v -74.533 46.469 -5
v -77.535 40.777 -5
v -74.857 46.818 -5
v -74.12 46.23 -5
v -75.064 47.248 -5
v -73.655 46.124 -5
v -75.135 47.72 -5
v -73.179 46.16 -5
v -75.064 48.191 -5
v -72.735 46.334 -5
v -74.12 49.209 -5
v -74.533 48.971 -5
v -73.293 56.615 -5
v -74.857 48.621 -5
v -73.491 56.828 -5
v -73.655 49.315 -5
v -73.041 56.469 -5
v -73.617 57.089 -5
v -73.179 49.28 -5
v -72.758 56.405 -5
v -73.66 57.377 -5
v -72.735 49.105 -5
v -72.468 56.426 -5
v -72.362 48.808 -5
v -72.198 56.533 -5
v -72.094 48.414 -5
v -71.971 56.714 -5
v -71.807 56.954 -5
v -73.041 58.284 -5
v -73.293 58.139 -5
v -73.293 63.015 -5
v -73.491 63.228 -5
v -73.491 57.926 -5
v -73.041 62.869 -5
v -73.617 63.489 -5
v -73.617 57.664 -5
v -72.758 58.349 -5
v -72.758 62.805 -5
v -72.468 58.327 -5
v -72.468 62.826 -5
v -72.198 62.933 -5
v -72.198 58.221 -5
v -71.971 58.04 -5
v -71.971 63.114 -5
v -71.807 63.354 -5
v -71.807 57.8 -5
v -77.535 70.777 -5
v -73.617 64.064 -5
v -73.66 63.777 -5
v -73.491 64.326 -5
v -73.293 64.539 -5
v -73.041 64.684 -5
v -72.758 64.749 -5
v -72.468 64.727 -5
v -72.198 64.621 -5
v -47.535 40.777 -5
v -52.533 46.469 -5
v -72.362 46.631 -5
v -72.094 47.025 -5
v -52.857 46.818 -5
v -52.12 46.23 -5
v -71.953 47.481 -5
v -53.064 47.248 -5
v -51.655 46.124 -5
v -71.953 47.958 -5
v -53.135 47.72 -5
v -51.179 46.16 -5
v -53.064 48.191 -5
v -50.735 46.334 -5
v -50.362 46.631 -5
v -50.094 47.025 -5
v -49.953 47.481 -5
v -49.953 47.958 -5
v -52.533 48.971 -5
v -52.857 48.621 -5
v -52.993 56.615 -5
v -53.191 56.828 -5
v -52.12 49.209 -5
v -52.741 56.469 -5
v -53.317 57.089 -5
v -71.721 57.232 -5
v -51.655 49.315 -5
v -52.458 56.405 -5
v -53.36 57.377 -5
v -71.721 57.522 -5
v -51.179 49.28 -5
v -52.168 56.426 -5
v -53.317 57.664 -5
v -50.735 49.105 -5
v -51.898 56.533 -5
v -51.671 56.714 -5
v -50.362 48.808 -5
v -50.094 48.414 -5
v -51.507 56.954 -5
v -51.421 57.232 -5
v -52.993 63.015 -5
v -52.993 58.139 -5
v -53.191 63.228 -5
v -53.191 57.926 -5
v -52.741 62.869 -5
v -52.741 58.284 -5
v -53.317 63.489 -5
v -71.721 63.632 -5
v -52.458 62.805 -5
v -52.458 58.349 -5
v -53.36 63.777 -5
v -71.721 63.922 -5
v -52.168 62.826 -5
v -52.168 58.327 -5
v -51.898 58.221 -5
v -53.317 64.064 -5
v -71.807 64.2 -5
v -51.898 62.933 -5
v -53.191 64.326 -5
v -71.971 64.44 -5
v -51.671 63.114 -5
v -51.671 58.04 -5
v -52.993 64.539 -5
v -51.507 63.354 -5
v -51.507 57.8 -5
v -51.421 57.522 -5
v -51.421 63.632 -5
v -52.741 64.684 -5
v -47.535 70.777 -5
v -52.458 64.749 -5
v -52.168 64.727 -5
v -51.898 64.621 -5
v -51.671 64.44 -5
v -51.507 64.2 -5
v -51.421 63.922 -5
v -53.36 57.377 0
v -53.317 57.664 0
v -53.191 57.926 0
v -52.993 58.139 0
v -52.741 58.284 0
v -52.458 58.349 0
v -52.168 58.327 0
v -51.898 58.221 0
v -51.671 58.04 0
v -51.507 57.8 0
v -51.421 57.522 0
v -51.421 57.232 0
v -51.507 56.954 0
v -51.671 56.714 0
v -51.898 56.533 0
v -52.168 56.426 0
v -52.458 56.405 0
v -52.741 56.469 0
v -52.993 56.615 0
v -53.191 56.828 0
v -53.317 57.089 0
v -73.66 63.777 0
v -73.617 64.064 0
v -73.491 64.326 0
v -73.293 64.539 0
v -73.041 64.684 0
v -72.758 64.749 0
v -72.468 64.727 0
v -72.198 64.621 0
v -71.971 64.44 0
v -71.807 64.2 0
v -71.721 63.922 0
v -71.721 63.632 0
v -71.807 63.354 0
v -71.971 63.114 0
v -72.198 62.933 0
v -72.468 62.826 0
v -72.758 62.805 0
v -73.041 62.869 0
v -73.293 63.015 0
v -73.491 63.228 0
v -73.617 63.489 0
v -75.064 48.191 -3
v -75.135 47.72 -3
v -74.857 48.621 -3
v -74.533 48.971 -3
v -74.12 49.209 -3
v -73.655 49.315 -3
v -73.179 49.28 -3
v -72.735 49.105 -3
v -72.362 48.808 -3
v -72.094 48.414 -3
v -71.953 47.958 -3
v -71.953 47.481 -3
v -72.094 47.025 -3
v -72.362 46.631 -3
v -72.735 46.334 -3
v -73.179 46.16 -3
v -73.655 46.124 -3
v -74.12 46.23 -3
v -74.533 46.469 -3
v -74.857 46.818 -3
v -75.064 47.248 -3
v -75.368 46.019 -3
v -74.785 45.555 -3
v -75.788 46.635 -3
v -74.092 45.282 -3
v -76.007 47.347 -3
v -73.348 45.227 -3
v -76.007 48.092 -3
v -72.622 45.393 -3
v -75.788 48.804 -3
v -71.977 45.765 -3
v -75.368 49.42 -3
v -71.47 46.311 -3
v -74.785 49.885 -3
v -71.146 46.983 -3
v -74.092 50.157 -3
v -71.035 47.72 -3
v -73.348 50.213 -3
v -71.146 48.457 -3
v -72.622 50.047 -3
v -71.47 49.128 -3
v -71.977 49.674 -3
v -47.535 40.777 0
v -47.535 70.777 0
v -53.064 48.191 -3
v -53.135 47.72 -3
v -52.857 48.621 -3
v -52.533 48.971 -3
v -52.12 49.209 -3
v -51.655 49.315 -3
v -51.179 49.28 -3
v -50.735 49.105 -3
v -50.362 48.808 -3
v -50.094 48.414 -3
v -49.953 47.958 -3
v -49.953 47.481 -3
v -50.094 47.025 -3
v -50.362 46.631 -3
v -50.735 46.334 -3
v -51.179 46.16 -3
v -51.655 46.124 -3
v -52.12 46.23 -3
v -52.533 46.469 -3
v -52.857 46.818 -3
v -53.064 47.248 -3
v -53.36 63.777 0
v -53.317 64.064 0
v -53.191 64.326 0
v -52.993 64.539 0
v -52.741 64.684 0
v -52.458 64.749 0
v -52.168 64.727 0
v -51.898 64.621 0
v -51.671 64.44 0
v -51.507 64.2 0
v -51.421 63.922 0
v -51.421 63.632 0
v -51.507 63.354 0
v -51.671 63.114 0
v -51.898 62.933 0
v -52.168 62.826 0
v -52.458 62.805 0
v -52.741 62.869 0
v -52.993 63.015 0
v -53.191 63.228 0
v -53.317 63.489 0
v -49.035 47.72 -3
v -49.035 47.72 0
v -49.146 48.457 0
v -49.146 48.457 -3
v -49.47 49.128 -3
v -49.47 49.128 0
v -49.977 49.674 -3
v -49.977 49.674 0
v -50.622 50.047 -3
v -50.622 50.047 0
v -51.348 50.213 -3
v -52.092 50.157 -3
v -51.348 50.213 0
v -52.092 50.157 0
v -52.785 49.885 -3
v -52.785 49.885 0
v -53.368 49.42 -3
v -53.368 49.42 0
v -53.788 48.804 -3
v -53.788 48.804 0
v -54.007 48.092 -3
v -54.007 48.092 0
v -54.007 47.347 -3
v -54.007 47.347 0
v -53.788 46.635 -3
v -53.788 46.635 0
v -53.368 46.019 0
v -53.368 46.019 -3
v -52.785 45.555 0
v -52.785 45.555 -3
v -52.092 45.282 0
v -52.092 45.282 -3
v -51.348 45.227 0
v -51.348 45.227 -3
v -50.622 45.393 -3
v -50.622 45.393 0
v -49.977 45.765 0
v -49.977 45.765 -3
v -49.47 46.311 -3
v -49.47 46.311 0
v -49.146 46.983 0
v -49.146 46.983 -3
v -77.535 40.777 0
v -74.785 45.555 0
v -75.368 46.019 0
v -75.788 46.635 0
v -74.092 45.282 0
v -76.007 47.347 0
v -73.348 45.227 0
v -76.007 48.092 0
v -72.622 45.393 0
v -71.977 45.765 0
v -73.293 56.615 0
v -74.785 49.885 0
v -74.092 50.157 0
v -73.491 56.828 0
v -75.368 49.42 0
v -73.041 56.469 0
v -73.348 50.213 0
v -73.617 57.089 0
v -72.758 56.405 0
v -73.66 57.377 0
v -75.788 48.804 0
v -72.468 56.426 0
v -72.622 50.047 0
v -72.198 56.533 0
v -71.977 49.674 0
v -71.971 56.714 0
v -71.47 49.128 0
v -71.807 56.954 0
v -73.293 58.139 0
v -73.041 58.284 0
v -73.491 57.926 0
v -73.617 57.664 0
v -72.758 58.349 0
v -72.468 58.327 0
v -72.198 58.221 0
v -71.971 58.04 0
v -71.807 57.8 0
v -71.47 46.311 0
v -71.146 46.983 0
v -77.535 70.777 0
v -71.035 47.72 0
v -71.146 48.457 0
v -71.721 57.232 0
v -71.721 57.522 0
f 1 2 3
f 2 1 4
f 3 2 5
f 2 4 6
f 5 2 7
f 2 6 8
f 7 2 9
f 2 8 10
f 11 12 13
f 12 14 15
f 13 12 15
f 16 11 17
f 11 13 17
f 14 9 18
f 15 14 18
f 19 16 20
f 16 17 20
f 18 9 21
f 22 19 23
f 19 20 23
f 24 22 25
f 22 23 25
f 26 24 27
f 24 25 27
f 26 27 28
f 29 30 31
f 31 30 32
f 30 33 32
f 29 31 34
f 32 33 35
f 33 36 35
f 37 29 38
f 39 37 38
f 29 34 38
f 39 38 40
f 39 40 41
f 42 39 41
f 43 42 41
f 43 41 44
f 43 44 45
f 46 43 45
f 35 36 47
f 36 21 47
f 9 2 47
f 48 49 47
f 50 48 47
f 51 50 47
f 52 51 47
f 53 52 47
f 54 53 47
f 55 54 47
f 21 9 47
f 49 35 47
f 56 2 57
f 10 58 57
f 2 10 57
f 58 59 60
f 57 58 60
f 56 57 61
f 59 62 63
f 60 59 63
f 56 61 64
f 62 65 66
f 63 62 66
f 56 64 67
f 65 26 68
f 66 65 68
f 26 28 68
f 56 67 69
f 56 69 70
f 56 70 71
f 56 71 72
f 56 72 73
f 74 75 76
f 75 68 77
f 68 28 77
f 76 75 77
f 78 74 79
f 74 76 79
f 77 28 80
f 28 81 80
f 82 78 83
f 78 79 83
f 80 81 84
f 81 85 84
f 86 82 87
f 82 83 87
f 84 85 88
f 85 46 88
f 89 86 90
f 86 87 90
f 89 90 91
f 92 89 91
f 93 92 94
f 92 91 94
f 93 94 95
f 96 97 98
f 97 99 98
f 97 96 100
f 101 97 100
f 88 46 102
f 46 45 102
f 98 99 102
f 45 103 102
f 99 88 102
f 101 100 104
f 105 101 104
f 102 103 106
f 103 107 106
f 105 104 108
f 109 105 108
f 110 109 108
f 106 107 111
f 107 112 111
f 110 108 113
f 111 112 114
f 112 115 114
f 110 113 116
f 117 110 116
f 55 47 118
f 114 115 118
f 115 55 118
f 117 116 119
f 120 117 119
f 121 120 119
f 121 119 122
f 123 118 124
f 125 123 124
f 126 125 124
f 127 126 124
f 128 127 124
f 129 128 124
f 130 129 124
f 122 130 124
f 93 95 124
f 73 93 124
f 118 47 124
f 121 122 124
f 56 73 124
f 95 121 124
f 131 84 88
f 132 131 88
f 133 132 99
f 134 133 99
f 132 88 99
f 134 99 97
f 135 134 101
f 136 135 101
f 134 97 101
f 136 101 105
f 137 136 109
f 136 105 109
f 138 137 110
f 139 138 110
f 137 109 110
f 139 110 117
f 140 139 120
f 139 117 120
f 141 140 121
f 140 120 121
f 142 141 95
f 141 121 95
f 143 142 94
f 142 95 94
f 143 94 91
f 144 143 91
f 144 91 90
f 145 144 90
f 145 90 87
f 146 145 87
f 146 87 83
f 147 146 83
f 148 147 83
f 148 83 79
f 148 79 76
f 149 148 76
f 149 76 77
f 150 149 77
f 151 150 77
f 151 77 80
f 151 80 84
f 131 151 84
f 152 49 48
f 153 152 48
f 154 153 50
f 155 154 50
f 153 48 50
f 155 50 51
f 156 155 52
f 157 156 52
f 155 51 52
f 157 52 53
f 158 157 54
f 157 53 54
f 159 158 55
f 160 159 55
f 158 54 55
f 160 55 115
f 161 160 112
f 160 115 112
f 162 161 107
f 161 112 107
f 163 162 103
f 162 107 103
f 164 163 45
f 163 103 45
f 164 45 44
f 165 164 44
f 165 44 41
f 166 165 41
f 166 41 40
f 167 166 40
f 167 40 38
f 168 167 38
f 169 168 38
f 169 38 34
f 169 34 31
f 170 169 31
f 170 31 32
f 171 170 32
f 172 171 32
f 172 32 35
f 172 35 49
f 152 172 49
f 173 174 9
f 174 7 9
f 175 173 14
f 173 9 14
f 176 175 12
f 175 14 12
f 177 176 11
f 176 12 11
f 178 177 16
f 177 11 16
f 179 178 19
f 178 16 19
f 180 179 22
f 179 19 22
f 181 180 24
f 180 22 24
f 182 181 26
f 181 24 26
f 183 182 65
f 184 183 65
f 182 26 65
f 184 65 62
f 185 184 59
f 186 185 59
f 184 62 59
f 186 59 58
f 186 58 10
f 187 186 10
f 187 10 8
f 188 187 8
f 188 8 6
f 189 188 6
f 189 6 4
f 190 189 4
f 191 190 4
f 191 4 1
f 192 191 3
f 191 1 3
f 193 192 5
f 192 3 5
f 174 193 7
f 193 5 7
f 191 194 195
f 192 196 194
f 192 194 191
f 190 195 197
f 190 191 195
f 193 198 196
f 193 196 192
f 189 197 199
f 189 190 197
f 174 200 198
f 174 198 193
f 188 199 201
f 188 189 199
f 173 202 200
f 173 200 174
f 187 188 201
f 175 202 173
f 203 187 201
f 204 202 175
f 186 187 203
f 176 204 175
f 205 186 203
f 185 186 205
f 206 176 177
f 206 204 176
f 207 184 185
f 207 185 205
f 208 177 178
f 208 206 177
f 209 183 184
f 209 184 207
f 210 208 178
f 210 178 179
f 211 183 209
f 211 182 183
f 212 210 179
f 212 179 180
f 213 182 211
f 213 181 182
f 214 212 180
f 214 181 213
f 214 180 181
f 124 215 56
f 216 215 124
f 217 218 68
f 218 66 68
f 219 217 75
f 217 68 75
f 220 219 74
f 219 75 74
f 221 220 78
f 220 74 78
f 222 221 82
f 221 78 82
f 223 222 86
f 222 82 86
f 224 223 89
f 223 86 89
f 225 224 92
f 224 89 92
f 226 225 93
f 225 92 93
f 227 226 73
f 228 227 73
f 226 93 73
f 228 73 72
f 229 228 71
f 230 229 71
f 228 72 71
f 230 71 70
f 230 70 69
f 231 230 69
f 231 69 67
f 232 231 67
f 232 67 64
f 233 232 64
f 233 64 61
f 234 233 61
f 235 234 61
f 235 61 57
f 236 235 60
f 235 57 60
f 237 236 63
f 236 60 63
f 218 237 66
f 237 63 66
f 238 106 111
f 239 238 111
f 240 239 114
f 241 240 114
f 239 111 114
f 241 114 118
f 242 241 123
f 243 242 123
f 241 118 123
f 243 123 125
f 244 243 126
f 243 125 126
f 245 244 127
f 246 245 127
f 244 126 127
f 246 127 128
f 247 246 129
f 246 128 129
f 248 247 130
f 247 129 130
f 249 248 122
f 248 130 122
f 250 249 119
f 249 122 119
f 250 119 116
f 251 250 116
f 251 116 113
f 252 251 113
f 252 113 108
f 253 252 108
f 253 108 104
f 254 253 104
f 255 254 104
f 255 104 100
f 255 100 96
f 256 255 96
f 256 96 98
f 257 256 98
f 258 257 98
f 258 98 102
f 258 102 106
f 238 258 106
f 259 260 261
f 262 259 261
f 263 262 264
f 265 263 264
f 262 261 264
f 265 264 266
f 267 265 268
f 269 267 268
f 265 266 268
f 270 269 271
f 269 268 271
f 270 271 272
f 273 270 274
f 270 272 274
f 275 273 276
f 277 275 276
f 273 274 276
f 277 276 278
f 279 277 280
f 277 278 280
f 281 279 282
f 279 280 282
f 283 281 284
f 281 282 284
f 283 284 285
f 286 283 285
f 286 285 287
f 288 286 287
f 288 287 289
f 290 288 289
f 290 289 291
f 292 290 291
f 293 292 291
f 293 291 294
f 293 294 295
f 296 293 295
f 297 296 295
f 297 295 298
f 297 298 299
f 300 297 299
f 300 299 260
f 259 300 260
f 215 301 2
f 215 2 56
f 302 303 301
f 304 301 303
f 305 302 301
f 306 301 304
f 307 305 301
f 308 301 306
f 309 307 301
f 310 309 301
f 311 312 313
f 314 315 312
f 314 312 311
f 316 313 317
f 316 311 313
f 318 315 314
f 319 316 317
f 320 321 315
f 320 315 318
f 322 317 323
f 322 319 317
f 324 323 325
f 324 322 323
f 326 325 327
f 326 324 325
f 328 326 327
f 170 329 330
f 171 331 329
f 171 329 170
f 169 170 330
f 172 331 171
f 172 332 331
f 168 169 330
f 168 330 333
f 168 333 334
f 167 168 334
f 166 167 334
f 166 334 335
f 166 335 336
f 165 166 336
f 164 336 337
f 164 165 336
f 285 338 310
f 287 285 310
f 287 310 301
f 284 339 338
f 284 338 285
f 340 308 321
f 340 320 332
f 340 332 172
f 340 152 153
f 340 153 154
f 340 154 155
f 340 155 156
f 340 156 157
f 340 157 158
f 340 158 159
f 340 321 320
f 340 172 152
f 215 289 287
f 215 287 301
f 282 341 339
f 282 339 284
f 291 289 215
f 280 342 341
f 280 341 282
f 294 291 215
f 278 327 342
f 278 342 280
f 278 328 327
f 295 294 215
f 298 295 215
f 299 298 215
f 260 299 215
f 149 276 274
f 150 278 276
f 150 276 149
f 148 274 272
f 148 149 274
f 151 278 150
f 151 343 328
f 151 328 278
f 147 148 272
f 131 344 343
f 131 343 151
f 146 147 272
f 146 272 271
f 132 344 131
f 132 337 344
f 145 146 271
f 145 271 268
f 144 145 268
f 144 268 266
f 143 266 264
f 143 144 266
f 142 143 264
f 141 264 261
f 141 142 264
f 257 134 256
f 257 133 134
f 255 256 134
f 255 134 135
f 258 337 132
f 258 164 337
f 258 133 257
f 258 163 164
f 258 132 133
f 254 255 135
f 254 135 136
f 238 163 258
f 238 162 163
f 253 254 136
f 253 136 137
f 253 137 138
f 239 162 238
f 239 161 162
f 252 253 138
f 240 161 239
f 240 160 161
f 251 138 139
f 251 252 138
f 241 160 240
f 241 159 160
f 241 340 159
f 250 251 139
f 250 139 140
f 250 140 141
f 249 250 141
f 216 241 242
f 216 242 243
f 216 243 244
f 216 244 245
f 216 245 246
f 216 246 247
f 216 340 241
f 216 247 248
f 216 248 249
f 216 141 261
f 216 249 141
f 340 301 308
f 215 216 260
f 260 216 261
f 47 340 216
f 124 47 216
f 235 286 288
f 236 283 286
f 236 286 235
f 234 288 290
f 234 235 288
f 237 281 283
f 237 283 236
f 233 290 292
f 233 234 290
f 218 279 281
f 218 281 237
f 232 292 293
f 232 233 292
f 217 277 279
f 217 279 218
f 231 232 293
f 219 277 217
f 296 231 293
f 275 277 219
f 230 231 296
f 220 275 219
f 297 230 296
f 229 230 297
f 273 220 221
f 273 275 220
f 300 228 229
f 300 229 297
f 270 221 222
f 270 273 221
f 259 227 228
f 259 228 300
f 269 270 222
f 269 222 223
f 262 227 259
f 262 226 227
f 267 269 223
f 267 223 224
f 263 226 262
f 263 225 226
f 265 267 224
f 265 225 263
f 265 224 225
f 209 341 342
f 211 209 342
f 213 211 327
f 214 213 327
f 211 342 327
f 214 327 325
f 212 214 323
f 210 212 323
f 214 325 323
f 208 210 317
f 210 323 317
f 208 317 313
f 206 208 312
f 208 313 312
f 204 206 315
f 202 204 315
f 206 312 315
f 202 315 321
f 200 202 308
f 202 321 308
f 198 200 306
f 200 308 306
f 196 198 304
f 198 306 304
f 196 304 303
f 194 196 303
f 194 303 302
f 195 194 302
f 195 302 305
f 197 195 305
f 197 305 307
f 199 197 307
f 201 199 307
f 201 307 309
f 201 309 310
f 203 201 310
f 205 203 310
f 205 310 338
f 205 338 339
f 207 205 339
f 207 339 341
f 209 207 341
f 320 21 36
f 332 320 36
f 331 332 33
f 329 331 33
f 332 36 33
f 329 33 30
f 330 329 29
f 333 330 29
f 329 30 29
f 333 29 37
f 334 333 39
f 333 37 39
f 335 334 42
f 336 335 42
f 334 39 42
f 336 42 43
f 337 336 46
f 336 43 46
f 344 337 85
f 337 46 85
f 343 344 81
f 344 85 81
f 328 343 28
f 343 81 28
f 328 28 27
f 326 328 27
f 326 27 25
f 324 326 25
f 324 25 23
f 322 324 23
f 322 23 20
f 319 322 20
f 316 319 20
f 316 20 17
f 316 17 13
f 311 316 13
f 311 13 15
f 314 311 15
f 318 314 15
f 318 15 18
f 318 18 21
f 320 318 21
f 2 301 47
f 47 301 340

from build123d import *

# Parameters (mm, degrees)
F0_W           = 30
F0_H           = 30
F1_DEPTH       = 5
F3_D           = 3.2
F3_CBORE_D     = 5
F3_CBORE_DEPTH = 3
F4_D           = 1.95


with BuildPart() as f1:
    # F0 (on Top) → F1 (new body)
    with BuildSketch(Plane.XY):
        with Locations((-62.535277, 55.776885)):
            Rectangle(F0_W, F0_H)
    extrude(amount=-F1_DEPTH)

    # F3 (through all)
    with Locations(Plane.XY):
        with Locations((-73.535277, 47.719706), (-51.535277, 47.719706)):
            CounterBoreHole(F3_D / 2, F3_CBORE_D / 2, F3_CBORE_DEPTH)

    # F4 (through all)
    with Locations(Plane.XY):
        with Locations((-52.385277, 57.376885), (-52.385277, 63.776885), (-72.685277, 57.376885), (-72.685277, 63.776885)):
            Hole(F4_D / 2)


solid = f1.part
